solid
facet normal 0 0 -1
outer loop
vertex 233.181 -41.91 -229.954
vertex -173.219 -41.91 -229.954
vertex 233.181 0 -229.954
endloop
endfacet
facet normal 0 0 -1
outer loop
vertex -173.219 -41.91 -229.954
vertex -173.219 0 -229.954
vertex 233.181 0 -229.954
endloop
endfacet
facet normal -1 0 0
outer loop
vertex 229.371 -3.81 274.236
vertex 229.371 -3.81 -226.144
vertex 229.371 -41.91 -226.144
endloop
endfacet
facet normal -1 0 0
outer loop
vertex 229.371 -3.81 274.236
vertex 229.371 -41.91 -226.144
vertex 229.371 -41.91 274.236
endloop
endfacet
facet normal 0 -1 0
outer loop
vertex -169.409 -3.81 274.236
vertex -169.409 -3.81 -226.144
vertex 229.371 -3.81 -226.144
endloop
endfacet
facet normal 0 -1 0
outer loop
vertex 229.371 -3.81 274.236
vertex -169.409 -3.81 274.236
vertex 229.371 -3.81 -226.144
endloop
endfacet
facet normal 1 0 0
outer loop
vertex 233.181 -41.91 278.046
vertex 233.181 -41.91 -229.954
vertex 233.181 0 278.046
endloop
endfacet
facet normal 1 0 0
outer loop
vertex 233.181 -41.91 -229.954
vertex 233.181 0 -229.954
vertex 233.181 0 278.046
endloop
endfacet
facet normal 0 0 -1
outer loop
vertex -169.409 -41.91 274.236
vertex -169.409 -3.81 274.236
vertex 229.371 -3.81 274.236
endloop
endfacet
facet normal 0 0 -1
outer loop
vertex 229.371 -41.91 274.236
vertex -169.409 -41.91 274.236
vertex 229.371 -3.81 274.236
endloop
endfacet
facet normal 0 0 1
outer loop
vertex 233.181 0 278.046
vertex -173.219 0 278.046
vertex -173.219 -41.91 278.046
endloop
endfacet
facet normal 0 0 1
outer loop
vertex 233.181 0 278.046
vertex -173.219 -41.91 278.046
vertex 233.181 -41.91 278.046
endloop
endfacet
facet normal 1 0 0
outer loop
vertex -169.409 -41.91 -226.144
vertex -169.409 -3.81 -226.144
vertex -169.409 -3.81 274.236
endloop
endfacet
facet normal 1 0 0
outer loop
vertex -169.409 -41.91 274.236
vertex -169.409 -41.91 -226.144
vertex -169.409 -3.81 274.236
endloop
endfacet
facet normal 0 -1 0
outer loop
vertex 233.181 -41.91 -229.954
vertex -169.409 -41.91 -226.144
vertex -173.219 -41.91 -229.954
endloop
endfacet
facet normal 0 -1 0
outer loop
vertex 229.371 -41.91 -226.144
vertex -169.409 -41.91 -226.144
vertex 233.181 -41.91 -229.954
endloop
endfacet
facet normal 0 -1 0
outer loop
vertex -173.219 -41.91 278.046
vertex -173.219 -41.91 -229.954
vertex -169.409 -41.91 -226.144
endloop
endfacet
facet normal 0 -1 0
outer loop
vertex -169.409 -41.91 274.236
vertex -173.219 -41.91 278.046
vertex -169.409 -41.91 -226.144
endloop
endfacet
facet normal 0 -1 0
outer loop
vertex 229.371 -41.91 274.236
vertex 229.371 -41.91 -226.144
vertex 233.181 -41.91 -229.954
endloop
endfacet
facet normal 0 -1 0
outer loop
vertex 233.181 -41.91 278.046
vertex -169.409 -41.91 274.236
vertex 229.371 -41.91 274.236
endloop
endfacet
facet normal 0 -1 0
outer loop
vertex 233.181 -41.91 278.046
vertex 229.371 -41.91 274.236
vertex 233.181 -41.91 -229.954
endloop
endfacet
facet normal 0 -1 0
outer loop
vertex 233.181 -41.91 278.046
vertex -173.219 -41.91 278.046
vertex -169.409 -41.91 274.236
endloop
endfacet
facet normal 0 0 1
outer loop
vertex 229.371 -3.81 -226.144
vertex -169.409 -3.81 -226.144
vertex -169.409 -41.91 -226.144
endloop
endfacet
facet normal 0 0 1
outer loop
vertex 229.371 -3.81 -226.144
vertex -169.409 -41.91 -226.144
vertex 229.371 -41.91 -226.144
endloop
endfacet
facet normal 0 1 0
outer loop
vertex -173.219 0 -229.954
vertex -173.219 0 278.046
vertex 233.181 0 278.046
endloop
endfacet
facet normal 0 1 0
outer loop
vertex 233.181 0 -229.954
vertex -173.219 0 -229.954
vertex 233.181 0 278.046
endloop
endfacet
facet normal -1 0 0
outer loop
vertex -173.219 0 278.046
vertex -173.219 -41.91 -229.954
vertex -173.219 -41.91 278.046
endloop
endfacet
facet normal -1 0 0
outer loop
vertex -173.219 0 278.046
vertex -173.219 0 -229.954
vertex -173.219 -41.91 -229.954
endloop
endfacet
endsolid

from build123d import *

# Parameters (mm, degrees)
F0_W     = 406.4
F0_H     = 508
F1_DEPTH = 3.81
F2_W     = 406.4
F2_H     = 508
F2_W_2   = 398.78
F2_H_2   = 500.38
F3_DEPTH = 38.1


with BuildPart() as f1:
    # F0 (on Front) → F1 (new body)
    with BuildSketch(Plane.XZ):
        with Locations((29.981383, 24.04566)):
            Rectangle(F0_W, F0_H)
    extrude(amount=F1_DEPTH)

    # F2 (on face) → F3 (join)
    with BuildSketch(Plane.XZ.offset(3.81)):
        with Locations((29.981383, 24.04566)):
            Rectangle(F2_W, F2_H)
        with Locations((29.981383, 24.04566)):
            Rectangle(F2_W_2, F2_H_2, mode=Mode.SUBTRACT)
    extrude(amount=F3_DEPTH)


solid = f1.part
